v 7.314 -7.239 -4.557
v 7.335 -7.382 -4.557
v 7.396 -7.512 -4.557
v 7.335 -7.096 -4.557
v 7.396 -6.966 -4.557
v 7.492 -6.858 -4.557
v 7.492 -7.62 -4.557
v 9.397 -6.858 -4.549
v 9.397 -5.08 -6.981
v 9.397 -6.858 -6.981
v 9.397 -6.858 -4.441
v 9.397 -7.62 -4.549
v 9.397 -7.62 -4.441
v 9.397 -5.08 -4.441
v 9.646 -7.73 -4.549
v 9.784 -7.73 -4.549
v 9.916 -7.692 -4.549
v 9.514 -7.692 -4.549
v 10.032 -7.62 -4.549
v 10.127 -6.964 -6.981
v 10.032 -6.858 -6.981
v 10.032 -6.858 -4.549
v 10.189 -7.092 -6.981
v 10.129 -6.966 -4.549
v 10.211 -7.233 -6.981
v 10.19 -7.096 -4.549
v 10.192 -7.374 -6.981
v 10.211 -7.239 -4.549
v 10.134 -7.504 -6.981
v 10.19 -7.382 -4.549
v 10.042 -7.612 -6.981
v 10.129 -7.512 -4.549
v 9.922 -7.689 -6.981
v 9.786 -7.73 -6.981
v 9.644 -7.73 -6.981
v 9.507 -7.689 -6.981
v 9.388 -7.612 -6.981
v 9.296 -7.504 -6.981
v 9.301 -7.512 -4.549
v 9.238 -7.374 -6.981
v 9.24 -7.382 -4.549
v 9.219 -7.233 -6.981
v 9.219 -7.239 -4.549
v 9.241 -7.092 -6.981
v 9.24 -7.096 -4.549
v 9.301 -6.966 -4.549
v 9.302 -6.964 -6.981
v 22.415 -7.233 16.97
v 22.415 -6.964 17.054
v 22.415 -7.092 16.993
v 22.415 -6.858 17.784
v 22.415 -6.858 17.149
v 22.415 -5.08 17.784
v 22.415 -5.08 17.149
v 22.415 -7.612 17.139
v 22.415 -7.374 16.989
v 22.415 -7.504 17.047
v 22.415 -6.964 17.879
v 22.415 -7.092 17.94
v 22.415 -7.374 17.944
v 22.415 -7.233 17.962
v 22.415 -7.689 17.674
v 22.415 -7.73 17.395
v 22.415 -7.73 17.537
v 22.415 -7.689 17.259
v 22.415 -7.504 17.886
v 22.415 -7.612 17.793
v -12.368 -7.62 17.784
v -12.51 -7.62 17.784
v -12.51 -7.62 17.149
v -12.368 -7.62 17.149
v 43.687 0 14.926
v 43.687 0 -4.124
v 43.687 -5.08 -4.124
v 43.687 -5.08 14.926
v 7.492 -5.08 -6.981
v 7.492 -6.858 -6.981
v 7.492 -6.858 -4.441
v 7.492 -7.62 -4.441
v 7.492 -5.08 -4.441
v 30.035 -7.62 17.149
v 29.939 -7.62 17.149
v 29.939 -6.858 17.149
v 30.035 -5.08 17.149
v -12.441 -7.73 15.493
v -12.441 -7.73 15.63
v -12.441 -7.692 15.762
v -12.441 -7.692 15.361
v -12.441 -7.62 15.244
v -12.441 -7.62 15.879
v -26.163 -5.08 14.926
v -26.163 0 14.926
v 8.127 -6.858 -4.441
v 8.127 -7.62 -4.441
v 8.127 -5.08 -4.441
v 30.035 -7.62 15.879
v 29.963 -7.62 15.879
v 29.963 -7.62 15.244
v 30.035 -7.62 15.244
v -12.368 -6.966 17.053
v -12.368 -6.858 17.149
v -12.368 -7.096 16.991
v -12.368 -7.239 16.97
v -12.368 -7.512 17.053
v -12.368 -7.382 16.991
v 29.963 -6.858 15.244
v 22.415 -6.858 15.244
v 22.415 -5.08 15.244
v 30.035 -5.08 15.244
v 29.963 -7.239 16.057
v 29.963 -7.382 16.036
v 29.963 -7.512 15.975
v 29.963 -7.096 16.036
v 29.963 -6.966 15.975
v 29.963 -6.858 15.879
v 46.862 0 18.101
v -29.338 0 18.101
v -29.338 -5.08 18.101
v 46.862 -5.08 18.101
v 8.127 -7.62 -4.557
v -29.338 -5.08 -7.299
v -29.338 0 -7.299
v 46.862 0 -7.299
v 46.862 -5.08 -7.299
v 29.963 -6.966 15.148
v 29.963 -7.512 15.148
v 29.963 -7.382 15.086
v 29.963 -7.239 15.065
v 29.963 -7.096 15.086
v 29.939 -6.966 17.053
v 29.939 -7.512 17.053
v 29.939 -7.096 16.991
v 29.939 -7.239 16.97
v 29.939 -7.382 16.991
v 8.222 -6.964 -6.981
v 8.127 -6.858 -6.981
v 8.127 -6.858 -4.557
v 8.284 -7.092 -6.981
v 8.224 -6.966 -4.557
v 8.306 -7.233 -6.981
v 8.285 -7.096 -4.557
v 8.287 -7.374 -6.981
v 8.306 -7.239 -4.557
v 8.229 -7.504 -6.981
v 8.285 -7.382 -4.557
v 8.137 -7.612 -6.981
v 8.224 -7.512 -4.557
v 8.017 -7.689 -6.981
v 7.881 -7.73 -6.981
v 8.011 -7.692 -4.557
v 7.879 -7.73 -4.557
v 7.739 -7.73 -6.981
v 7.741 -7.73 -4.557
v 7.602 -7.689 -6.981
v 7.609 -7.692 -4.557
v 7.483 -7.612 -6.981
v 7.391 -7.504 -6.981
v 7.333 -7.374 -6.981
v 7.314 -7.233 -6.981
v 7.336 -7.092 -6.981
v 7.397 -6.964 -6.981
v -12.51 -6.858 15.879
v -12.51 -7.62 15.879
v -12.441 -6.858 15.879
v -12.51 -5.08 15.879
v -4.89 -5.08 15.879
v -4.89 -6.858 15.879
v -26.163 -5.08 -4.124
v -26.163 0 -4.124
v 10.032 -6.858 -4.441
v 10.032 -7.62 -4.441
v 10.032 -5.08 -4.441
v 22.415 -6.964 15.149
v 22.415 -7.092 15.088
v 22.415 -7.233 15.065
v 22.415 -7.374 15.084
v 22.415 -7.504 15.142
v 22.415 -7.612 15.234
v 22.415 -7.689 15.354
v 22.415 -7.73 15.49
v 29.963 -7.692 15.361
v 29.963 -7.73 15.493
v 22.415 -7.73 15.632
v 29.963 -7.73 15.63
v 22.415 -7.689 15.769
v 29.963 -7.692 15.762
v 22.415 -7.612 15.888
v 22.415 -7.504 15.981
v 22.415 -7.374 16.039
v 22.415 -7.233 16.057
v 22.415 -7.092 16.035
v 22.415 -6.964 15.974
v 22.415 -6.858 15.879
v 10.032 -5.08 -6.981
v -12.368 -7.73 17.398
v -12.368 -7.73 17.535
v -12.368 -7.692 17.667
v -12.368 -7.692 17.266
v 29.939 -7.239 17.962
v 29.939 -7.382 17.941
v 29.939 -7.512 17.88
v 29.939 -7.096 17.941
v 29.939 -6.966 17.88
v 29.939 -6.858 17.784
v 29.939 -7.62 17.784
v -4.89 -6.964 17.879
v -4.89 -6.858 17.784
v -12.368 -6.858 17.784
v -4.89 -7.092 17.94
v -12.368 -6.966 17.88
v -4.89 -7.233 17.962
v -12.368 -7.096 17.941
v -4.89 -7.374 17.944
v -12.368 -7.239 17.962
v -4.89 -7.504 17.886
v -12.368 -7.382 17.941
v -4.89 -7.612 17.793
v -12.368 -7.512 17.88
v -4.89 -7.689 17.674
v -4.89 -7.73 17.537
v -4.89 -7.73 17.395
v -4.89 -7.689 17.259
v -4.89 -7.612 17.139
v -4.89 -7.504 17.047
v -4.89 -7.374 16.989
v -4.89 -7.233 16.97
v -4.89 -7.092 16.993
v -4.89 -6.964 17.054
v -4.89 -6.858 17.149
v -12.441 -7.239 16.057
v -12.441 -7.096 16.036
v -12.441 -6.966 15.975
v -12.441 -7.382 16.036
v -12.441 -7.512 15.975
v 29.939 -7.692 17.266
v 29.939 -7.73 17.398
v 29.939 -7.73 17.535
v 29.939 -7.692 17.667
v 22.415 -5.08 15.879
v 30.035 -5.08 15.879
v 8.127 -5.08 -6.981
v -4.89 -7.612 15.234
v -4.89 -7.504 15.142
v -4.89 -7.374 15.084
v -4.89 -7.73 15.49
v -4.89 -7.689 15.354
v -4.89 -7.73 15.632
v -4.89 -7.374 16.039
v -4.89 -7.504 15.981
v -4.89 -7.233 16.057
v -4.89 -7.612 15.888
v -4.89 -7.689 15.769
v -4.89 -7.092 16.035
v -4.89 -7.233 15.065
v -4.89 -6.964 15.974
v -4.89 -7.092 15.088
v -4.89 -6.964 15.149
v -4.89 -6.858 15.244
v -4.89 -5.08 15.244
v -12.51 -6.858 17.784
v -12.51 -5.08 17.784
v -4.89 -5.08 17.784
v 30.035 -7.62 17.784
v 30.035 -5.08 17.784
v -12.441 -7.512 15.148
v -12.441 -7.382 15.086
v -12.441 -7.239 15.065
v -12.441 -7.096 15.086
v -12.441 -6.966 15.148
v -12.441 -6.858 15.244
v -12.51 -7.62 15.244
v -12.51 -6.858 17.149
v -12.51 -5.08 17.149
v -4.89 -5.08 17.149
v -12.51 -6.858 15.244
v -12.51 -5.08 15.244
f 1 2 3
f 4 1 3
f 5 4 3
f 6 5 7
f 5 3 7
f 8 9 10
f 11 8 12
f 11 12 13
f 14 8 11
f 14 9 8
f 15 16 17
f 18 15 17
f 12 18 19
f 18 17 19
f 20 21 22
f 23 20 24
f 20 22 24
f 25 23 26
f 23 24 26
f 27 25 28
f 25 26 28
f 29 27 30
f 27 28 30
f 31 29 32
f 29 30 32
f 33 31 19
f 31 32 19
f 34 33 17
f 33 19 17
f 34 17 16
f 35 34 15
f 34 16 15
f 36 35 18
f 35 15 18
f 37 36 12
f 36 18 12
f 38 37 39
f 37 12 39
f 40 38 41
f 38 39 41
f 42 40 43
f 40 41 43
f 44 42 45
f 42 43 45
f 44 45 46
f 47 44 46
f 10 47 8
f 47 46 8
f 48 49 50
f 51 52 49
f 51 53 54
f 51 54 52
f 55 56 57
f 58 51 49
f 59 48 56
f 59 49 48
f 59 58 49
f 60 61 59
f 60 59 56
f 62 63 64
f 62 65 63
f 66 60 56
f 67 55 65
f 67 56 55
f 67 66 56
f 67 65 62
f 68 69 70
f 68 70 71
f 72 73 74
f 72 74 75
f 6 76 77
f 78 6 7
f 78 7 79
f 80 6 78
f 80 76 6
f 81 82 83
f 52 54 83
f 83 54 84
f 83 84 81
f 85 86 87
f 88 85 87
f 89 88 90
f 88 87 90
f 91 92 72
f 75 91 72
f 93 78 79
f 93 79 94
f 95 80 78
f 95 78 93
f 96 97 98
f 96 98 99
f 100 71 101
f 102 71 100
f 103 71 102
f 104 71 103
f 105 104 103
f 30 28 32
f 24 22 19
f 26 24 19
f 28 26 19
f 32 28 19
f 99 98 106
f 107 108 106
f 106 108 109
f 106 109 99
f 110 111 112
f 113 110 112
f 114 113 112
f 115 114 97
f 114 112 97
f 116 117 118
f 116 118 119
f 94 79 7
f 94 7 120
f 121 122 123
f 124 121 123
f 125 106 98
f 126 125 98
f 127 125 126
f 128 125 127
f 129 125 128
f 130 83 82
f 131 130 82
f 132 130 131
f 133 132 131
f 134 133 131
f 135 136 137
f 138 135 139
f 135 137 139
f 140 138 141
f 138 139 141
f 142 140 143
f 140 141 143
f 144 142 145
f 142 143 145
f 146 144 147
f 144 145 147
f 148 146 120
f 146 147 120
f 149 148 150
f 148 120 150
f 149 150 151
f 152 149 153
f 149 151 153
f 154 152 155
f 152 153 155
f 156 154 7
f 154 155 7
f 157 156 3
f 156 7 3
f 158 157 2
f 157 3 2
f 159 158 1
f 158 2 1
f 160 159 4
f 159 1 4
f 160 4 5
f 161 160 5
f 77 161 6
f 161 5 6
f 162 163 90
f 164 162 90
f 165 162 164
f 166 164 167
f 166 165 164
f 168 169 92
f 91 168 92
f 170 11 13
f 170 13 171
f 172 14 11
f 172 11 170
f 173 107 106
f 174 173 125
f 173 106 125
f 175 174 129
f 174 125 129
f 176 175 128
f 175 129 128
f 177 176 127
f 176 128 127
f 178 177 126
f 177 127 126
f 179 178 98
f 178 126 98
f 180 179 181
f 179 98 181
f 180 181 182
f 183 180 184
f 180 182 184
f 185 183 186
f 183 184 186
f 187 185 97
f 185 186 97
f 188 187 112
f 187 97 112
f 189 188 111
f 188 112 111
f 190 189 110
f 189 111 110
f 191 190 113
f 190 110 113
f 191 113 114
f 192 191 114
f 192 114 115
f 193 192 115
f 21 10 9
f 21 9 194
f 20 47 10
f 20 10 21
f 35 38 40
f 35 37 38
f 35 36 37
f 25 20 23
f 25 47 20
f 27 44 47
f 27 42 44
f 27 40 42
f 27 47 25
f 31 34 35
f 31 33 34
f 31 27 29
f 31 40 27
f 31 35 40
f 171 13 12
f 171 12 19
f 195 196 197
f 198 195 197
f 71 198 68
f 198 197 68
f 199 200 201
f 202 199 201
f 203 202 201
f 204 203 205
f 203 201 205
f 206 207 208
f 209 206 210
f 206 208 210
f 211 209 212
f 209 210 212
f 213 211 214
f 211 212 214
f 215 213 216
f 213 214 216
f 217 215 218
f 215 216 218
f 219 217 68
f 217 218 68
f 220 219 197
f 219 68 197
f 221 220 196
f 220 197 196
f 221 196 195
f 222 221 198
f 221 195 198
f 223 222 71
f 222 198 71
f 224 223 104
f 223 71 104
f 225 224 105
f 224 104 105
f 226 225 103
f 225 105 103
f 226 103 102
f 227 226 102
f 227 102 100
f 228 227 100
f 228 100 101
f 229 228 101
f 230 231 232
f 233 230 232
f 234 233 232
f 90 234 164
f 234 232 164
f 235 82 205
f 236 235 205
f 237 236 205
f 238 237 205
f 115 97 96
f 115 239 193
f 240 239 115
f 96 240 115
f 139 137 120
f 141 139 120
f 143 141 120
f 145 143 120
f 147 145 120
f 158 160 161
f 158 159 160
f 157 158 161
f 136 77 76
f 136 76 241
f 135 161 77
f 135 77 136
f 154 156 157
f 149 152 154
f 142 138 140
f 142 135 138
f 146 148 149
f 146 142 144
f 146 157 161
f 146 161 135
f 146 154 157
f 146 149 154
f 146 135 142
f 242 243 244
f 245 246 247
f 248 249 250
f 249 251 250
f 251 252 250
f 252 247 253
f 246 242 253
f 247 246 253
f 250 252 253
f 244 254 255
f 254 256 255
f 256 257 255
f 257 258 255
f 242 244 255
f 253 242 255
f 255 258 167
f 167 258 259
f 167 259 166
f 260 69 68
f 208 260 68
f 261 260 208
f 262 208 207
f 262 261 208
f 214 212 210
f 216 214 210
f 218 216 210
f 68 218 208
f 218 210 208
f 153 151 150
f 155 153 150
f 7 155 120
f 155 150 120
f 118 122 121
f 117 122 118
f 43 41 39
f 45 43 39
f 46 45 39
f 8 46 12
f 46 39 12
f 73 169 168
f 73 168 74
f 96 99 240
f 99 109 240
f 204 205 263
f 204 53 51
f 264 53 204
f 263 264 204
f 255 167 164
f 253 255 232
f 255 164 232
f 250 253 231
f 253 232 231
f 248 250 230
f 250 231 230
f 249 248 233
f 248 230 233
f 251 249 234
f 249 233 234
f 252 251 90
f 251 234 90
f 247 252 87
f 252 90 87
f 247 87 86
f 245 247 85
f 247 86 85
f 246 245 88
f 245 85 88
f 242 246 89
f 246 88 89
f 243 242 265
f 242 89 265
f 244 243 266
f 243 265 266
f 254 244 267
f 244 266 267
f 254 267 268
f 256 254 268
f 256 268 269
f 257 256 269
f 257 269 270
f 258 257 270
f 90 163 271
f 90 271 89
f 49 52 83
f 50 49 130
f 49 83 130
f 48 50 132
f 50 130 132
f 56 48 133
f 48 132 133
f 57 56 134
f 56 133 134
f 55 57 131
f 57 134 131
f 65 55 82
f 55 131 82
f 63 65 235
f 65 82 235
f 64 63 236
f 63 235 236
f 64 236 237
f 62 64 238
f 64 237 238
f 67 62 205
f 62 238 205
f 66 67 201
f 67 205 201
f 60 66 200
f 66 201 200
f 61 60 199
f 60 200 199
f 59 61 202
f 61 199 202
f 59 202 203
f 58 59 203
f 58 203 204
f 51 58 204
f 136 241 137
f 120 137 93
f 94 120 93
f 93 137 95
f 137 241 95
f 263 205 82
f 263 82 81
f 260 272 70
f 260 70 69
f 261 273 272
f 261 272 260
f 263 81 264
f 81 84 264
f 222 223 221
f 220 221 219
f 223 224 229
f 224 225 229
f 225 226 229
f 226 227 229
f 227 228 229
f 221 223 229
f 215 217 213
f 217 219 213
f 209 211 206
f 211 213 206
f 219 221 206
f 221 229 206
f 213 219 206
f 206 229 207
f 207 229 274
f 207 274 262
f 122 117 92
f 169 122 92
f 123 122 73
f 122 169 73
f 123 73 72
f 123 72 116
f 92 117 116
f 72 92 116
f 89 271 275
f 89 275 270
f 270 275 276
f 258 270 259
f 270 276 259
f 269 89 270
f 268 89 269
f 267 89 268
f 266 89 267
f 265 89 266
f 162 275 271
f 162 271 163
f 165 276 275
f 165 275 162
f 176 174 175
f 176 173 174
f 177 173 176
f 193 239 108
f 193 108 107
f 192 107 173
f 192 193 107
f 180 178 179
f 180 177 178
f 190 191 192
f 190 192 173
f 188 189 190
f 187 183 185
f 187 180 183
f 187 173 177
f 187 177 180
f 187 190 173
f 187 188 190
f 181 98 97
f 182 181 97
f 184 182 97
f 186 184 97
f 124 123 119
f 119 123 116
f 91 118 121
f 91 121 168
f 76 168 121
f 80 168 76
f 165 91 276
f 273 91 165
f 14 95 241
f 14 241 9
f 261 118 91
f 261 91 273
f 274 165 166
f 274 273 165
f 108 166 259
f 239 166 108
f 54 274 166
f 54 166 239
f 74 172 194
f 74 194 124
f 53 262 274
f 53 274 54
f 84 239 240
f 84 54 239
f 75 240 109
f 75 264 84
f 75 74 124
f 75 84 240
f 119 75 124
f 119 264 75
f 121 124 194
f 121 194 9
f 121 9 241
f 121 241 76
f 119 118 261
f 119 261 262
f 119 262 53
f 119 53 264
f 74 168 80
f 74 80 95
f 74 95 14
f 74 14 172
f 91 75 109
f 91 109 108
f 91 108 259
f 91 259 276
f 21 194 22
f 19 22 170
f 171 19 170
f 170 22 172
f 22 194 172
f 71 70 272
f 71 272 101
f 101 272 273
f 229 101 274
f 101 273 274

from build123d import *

# Parameters (mm, degrees)
F0_W      = 76.2
F0_H      = 25.4
F0_W_2    = 69.85
F0_H_2    = 19.05
F1_DEPTH  = 5.08
F2_W      = 7.62
F2_H      = 0.635
F3_DEPTH  = 1.778
F4_W      = 0.635
F4_H      = 2.54
F5_DEPTH  = 1.778
F6_W      = 0.1422071991
F6_H      = 0.635
F7_DEPTH  = 0.762
F8_R      = 0.4959508544
F9_DEPTH  = 7.4777928009
F10_W     = 0.0690778879
F10_H     = 0.635
F11_DEPTH = 0.762
F12_R     = 0.4959508544
F13_DEPTH = 7.5509221121
F14_W     = 0.095821996
F14_H     = 0.635
F15_DEPTH = 0.762
F16_R     = 0.4959508544
F17_DEPTH = 7.524178004
F18_W     = 0.0717212304
F18_H     = 0.635
F19_DEPTH = 0.762
F20_R     = 0.4959508544
F21_DEPTH = 7.5482787696
F22_W     = 0.635
F22_H     = 0.1154780363
F23_DEPTH = 0.762
F24_R     = 0.4959508544
F25_DEPTH = 2.4245219637
F26_W     = 0.635
F26_H     = 0.1073694763
F27_DEPTH = 0.762
F28_R     = 0.4959508544
F29_DEPTH = 2.4326305237


with BuildPart() as f1:
    # F0 (on Front) → F1 (new body)
    with BuildSketch(Plane.XZ):
        with Locations((8.76239234, 5.4013291374)):
            Rectangle(F0_W, F0_H)
        with Locations((8.76239234, 5.4013291374)):
            Rectangle(F0_W_2, F0_H_2, mode=Mode.SUBTRACT)
    extrude(amount=F1_DEPTH)

    # F2 (on face) → F3 (join)
    with BuildSketch(Plane.XZ.offset(5.08)):
        with Locations((26.22489234, 17.4663291374)):
            Rectangle(F2_W, F2_H)
        with Locations((26.22489234, 15.5613291374)):
            Rectangle(F2_W, F2_H)
        with Locations((-8.70010766, 17.4663291374)):
            Rectangle(F2_W, F2_H)
        with Locations((-8.70010766, 15.5613291374)):
            Rectangle(F2_W, F2_H)
    extrude(amount=F3_DEPTH)

    # F4 (on face) → F5 (join)
    with BuildSketch(Plane.XZ.offset(5.08)):
        with Locations((9.71489234, -5.7111708626)):
            Rectangle(F4_W, F4_H)
        with Locations((7.80989234, -5.7111708626)):
            Rectangle(F4_W, F4_H)
    extrude(amount=F5_DEPTH)

    # F6 (on face) → F7 (join)
    with BuildSketch(Plane.XZ.offset(6.858)):
        with Locations((-12.4390040605, 17.4663291374)):
            Rectangle(F6_W, F6_H)
    extrude(amount=F7_DEPTH)

    # F8 (on face) → F9 (join, through all)
    with BuildSketch(Plane.YZ.offset(-12.367900461)):
        with Locations((-7.239, 17.4663291374)):
            Circle(F8_R)
    extrude(amount=F9_DEPTH)

    # F10 (on face) → F11 (join)
    with BuildSketch(Plane.XZ.offset(6.858)):
        with Locations((-12.4755687161, 15.5613291374)):
            Rectangle(F10_W, F10_H)
    extrude(amount=F11_DEPTH)

    # F12 (on face) → F13 (join, through all)
    with BuildSketch(Plane.YZ.offset(-12.4410297722)):
        with Locations((-7.239, 15.5613291374)):
            Circle(F12_R)
    extrude(amount=F13_DEPTH)

    # F14 (on face) → F15 (join)
    with BuildSketch(Plane.XZ.offset(6.858)):
        with Locations((29.986981342, 17.4663291374)):
            Rectangle(F14_W, F14_H)
    extrude(amount=F15_DEPTH)

    # F16 (on face) → F17 (join, through all)
    with BuildSketch(Plane(origin=(29.939070344, 0, 0), x_dir=(0, -1, 0), z_dir=(-1, 0, 0))):
        with Locations((7.239, 17.4663291374)):
            Circle(F16_R)
    extrude(amount=F17_DEPTH)

    # F18 (on face) → F19 (join)
    with BuildSketch(Plane.XZ.offset(6.858)):
        with Locations((29.9990317248, 15.5613291374)):
            Rectangle(F18_W, F18_H)
    extrude(amount=F19_DEPTH)

    # F20 (on face) → F21 (join, through all)
    with BuildSketch(Plane(origin=(29.9631711096, 0, 0), x_dir=(0, -1, 0), z_dir=(-1, 0, 0))):
        with Locations((7.239, 15.5613291374)):
            Circle(F20_R)
    extrude(amount=F21_DEPTH)

    # F22 (on face) → F23 (join)
    with BuildSketch(Plane.XZ.offset(6.858)):
        with Locations((7.80989234, -4.4989098807)):
            Rectangle(F22_W, F22_H)
    extrude(amount=F23_DEPTH)

    # F24 (on face) → F25 (join, through all)
    with BuildSketch(Plane(origin=(0, 0, -4.5566488989), x_dir=(1, 0, 0), z_dir=(0, 0, -1))):
        with Locations((7.80989234, 7.239)):
            Circle(F24_R)
    extrude(amount=F25_DEPTH)

    # F26 (on face) → F27 (join)
    with BuildSketch(Plane.XZ.offset(6.858)):
        with Locations((9.71489234, -4.4948556007)):
            Rectangle(F26_W, F26_H)
    extrude(amount=F27_DEPTH)

    # F28 (on face) → F29 (join, through all)
    with BuildSketch(Plane(origin=(0, 0, -4.5485403389), x_dir=(1, 0, 0), z_dir=(0, 0, -1))):
        with Locations((9.71489234, 7.239)):
            Circle(F28_R)
    extrude(amount=F29_DEPTH)


solid = f1.part
